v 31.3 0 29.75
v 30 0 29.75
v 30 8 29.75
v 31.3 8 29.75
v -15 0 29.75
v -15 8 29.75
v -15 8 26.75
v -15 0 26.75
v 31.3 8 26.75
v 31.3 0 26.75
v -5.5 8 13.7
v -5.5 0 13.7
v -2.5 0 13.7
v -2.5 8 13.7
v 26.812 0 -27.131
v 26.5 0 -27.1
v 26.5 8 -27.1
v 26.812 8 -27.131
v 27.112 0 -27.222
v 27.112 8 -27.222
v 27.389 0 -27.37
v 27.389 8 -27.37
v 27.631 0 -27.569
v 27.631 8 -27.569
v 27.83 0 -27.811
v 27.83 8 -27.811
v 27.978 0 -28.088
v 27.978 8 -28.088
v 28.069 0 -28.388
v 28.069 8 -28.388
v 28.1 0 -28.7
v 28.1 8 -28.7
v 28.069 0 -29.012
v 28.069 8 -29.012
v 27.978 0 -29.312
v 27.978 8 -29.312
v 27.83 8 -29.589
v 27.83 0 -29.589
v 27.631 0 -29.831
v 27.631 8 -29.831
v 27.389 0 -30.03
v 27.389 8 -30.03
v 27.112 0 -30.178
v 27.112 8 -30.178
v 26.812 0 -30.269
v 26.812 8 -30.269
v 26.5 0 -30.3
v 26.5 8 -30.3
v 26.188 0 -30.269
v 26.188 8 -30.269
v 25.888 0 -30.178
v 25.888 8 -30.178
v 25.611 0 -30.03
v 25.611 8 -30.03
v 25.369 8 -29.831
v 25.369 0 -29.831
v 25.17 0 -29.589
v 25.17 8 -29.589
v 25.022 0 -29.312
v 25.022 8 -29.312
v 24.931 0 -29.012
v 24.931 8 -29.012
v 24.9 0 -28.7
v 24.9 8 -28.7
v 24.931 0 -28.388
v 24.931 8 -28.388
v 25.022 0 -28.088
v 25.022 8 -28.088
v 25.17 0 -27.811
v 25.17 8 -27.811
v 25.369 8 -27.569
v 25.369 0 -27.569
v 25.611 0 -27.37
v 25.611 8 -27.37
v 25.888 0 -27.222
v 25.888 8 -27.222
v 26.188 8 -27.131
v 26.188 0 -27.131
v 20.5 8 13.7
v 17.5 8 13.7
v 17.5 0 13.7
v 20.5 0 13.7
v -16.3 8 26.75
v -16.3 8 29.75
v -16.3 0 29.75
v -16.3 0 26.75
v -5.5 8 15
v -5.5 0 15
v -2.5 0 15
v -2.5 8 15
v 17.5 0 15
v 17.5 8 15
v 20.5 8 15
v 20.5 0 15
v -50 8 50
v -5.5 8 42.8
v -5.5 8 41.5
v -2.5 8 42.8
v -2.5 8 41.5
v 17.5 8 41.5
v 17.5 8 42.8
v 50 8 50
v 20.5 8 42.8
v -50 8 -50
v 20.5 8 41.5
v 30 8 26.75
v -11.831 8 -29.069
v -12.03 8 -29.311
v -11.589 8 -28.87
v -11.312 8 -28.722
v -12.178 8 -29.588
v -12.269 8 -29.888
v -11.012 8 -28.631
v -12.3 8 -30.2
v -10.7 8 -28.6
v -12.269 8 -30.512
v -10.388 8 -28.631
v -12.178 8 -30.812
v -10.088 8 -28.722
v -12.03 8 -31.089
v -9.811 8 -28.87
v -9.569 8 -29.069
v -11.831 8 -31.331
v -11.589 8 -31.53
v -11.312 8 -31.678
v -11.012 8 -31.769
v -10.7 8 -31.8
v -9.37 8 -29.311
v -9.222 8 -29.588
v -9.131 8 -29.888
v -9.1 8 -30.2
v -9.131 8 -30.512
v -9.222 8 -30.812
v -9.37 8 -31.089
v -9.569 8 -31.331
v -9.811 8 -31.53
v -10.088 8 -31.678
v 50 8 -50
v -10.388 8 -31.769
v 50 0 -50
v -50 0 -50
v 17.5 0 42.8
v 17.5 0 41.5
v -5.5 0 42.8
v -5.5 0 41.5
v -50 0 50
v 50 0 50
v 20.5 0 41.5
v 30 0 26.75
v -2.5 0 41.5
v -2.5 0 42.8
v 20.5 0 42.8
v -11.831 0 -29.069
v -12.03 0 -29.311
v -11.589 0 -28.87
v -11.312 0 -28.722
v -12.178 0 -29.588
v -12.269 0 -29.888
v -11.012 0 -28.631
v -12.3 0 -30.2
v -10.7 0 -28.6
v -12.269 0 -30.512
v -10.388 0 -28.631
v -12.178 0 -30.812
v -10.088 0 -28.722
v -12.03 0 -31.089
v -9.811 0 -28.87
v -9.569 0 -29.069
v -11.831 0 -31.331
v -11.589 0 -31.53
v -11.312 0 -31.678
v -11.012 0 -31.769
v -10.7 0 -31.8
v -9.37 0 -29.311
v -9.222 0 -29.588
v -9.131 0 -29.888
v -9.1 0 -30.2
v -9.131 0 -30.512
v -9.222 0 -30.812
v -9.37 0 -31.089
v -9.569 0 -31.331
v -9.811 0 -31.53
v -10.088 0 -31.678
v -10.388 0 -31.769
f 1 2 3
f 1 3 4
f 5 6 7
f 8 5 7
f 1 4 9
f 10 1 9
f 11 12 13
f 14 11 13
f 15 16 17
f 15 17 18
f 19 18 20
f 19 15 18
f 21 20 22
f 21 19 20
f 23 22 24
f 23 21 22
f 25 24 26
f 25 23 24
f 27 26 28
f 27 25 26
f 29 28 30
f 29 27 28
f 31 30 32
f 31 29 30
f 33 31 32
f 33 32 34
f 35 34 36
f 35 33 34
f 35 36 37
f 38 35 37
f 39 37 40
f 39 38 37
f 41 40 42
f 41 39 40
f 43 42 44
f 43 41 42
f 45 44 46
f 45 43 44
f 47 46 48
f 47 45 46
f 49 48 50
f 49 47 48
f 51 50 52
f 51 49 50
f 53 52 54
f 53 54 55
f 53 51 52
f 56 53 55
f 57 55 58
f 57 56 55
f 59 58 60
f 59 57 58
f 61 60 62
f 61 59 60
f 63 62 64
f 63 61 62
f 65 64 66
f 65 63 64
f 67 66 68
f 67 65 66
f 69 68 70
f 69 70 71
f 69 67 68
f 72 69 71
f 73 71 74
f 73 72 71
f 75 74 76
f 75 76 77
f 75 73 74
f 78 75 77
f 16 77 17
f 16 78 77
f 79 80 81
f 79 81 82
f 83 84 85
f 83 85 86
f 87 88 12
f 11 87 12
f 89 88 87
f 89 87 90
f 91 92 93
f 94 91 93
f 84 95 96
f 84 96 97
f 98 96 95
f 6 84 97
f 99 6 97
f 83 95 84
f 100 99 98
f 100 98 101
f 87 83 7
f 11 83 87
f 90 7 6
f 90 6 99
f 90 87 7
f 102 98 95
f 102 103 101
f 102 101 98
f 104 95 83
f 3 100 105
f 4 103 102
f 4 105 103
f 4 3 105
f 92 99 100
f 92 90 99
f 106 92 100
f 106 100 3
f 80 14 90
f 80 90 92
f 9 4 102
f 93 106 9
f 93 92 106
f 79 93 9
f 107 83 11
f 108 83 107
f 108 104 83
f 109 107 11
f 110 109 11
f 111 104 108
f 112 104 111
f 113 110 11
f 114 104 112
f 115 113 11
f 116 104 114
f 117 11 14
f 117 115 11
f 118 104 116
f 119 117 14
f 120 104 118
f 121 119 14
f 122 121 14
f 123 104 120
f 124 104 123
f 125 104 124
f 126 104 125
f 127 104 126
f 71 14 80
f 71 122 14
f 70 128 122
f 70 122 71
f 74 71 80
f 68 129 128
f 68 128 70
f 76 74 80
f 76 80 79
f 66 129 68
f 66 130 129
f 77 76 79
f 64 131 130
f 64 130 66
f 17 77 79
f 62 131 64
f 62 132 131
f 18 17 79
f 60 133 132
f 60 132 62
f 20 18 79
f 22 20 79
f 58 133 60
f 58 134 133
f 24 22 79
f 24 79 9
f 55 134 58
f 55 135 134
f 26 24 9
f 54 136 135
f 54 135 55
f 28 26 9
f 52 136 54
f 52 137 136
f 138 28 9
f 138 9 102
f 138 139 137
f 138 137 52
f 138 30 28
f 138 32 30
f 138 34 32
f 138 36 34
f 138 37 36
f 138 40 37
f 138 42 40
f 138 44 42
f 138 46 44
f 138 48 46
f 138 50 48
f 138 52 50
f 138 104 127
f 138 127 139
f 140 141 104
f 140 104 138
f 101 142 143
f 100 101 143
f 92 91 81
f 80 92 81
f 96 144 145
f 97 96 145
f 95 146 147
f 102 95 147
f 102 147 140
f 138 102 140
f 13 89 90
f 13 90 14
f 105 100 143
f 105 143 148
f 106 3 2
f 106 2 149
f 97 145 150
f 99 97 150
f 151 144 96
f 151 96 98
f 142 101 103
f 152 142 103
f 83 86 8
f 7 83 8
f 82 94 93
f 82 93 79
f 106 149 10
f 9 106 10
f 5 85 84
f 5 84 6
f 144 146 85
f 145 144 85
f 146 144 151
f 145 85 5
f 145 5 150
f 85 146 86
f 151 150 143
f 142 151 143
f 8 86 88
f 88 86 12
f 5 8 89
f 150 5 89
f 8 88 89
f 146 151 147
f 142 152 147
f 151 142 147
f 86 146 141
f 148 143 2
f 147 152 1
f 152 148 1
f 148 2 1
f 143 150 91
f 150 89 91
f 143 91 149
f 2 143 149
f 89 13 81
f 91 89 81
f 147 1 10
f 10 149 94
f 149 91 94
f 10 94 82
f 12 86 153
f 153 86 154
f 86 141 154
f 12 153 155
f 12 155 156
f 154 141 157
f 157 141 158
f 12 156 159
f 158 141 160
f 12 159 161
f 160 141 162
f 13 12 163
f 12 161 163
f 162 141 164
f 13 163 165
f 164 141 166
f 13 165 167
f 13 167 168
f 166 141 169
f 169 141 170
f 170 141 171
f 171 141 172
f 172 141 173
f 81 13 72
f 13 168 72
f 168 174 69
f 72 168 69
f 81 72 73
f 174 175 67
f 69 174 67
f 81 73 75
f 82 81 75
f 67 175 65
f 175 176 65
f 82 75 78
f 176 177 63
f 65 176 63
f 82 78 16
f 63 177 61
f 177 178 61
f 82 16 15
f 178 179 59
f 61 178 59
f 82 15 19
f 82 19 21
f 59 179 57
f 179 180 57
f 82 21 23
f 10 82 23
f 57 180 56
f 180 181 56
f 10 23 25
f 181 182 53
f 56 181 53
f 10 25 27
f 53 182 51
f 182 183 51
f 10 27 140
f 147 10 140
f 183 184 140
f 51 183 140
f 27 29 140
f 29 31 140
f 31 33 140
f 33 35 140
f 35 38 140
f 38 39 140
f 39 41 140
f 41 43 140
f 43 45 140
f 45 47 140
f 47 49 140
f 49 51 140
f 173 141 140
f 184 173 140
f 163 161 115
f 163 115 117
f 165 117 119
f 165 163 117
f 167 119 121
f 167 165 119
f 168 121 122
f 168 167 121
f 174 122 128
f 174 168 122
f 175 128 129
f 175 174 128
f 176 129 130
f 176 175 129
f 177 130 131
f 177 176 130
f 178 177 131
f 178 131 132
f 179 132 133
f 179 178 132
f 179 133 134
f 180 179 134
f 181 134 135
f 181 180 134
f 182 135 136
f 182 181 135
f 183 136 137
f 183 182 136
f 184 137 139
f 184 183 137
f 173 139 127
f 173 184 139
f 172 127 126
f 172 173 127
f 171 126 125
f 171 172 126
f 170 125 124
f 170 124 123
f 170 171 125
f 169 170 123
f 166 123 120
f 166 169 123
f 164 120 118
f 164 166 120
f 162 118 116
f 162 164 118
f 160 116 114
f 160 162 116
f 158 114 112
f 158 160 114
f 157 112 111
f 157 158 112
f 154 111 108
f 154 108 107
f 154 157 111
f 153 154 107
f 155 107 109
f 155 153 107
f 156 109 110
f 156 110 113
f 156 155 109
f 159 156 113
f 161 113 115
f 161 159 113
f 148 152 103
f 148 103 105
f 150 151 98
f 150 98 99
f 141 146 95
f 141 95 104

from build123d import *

# Parameters (mm, degrees)
SKETCH1_W           = 100
SKETCH1_H           = 100
SKETCH1_R           = 1.6
SKETCH1_W_2         = 3
SKETCH1_H_2         = 1.3
SKETCH1_W_3         = 1.3
SKETCH1_H_3         = 3
BOSS_EXTRUDE1_DEPTH = 8


with BuildPart() as part:
    # Sketch1 → Boss-Extrude1 (new body)
    with BuildSketch(Plane(origin=(0, 0, 0), x_dir=(1, 0, 0), z_dir=(0, 1, 0))):
        Rectangle(SKETCH1_W, SKETCH1_H)
        with Locations(Location((26.5, 28.7, 0), (0, 0, 270))):
            Circle(SKETCH1_R, mode=Mode.SUBTRACT)
        with Locations(Location((-10.7, 30.2, 0), (0, 0, 270))):
            Circle(SKETCH1_R, mode=Mode.SUBTRACT)
        with Locations((19, -14.35)):
            Rectangle(SKETCH1_W_2, SKETCH1_H_2, mode=Mode.SUBTRACT)
        with Locations((-4, -14.35)):
            Rectangle(SKETCH1_W_2, SKETCH1_H_2, mode=Mode.SUBTRACT)
        with Locations((-15.65, -28.25)):
            Rectangle(SKETCH1_W_3, SKETCH1_H_3, mode=Mode.SUBTRACT)
        with Locations((30.65, -28.25)):
            Rectangle(SKETCH1_W_3, SKETCH1_H_3, mode=Mode.SUBTRACT)
        with Locations((19, -42.15)):
            Rectangle(SKETCH1_W_2, SKETCH1_H_2, mode=Mode.SUBTRACT)
        with Locations((-4, -42.15)):
            Rectangle(SKETCH1_W_2, SKETCH1_H_2, mode=Mode.SUBTRACT)
    extrude(amount=BOSS_EXTRUDE1_DEPTH)


solid = part.part
